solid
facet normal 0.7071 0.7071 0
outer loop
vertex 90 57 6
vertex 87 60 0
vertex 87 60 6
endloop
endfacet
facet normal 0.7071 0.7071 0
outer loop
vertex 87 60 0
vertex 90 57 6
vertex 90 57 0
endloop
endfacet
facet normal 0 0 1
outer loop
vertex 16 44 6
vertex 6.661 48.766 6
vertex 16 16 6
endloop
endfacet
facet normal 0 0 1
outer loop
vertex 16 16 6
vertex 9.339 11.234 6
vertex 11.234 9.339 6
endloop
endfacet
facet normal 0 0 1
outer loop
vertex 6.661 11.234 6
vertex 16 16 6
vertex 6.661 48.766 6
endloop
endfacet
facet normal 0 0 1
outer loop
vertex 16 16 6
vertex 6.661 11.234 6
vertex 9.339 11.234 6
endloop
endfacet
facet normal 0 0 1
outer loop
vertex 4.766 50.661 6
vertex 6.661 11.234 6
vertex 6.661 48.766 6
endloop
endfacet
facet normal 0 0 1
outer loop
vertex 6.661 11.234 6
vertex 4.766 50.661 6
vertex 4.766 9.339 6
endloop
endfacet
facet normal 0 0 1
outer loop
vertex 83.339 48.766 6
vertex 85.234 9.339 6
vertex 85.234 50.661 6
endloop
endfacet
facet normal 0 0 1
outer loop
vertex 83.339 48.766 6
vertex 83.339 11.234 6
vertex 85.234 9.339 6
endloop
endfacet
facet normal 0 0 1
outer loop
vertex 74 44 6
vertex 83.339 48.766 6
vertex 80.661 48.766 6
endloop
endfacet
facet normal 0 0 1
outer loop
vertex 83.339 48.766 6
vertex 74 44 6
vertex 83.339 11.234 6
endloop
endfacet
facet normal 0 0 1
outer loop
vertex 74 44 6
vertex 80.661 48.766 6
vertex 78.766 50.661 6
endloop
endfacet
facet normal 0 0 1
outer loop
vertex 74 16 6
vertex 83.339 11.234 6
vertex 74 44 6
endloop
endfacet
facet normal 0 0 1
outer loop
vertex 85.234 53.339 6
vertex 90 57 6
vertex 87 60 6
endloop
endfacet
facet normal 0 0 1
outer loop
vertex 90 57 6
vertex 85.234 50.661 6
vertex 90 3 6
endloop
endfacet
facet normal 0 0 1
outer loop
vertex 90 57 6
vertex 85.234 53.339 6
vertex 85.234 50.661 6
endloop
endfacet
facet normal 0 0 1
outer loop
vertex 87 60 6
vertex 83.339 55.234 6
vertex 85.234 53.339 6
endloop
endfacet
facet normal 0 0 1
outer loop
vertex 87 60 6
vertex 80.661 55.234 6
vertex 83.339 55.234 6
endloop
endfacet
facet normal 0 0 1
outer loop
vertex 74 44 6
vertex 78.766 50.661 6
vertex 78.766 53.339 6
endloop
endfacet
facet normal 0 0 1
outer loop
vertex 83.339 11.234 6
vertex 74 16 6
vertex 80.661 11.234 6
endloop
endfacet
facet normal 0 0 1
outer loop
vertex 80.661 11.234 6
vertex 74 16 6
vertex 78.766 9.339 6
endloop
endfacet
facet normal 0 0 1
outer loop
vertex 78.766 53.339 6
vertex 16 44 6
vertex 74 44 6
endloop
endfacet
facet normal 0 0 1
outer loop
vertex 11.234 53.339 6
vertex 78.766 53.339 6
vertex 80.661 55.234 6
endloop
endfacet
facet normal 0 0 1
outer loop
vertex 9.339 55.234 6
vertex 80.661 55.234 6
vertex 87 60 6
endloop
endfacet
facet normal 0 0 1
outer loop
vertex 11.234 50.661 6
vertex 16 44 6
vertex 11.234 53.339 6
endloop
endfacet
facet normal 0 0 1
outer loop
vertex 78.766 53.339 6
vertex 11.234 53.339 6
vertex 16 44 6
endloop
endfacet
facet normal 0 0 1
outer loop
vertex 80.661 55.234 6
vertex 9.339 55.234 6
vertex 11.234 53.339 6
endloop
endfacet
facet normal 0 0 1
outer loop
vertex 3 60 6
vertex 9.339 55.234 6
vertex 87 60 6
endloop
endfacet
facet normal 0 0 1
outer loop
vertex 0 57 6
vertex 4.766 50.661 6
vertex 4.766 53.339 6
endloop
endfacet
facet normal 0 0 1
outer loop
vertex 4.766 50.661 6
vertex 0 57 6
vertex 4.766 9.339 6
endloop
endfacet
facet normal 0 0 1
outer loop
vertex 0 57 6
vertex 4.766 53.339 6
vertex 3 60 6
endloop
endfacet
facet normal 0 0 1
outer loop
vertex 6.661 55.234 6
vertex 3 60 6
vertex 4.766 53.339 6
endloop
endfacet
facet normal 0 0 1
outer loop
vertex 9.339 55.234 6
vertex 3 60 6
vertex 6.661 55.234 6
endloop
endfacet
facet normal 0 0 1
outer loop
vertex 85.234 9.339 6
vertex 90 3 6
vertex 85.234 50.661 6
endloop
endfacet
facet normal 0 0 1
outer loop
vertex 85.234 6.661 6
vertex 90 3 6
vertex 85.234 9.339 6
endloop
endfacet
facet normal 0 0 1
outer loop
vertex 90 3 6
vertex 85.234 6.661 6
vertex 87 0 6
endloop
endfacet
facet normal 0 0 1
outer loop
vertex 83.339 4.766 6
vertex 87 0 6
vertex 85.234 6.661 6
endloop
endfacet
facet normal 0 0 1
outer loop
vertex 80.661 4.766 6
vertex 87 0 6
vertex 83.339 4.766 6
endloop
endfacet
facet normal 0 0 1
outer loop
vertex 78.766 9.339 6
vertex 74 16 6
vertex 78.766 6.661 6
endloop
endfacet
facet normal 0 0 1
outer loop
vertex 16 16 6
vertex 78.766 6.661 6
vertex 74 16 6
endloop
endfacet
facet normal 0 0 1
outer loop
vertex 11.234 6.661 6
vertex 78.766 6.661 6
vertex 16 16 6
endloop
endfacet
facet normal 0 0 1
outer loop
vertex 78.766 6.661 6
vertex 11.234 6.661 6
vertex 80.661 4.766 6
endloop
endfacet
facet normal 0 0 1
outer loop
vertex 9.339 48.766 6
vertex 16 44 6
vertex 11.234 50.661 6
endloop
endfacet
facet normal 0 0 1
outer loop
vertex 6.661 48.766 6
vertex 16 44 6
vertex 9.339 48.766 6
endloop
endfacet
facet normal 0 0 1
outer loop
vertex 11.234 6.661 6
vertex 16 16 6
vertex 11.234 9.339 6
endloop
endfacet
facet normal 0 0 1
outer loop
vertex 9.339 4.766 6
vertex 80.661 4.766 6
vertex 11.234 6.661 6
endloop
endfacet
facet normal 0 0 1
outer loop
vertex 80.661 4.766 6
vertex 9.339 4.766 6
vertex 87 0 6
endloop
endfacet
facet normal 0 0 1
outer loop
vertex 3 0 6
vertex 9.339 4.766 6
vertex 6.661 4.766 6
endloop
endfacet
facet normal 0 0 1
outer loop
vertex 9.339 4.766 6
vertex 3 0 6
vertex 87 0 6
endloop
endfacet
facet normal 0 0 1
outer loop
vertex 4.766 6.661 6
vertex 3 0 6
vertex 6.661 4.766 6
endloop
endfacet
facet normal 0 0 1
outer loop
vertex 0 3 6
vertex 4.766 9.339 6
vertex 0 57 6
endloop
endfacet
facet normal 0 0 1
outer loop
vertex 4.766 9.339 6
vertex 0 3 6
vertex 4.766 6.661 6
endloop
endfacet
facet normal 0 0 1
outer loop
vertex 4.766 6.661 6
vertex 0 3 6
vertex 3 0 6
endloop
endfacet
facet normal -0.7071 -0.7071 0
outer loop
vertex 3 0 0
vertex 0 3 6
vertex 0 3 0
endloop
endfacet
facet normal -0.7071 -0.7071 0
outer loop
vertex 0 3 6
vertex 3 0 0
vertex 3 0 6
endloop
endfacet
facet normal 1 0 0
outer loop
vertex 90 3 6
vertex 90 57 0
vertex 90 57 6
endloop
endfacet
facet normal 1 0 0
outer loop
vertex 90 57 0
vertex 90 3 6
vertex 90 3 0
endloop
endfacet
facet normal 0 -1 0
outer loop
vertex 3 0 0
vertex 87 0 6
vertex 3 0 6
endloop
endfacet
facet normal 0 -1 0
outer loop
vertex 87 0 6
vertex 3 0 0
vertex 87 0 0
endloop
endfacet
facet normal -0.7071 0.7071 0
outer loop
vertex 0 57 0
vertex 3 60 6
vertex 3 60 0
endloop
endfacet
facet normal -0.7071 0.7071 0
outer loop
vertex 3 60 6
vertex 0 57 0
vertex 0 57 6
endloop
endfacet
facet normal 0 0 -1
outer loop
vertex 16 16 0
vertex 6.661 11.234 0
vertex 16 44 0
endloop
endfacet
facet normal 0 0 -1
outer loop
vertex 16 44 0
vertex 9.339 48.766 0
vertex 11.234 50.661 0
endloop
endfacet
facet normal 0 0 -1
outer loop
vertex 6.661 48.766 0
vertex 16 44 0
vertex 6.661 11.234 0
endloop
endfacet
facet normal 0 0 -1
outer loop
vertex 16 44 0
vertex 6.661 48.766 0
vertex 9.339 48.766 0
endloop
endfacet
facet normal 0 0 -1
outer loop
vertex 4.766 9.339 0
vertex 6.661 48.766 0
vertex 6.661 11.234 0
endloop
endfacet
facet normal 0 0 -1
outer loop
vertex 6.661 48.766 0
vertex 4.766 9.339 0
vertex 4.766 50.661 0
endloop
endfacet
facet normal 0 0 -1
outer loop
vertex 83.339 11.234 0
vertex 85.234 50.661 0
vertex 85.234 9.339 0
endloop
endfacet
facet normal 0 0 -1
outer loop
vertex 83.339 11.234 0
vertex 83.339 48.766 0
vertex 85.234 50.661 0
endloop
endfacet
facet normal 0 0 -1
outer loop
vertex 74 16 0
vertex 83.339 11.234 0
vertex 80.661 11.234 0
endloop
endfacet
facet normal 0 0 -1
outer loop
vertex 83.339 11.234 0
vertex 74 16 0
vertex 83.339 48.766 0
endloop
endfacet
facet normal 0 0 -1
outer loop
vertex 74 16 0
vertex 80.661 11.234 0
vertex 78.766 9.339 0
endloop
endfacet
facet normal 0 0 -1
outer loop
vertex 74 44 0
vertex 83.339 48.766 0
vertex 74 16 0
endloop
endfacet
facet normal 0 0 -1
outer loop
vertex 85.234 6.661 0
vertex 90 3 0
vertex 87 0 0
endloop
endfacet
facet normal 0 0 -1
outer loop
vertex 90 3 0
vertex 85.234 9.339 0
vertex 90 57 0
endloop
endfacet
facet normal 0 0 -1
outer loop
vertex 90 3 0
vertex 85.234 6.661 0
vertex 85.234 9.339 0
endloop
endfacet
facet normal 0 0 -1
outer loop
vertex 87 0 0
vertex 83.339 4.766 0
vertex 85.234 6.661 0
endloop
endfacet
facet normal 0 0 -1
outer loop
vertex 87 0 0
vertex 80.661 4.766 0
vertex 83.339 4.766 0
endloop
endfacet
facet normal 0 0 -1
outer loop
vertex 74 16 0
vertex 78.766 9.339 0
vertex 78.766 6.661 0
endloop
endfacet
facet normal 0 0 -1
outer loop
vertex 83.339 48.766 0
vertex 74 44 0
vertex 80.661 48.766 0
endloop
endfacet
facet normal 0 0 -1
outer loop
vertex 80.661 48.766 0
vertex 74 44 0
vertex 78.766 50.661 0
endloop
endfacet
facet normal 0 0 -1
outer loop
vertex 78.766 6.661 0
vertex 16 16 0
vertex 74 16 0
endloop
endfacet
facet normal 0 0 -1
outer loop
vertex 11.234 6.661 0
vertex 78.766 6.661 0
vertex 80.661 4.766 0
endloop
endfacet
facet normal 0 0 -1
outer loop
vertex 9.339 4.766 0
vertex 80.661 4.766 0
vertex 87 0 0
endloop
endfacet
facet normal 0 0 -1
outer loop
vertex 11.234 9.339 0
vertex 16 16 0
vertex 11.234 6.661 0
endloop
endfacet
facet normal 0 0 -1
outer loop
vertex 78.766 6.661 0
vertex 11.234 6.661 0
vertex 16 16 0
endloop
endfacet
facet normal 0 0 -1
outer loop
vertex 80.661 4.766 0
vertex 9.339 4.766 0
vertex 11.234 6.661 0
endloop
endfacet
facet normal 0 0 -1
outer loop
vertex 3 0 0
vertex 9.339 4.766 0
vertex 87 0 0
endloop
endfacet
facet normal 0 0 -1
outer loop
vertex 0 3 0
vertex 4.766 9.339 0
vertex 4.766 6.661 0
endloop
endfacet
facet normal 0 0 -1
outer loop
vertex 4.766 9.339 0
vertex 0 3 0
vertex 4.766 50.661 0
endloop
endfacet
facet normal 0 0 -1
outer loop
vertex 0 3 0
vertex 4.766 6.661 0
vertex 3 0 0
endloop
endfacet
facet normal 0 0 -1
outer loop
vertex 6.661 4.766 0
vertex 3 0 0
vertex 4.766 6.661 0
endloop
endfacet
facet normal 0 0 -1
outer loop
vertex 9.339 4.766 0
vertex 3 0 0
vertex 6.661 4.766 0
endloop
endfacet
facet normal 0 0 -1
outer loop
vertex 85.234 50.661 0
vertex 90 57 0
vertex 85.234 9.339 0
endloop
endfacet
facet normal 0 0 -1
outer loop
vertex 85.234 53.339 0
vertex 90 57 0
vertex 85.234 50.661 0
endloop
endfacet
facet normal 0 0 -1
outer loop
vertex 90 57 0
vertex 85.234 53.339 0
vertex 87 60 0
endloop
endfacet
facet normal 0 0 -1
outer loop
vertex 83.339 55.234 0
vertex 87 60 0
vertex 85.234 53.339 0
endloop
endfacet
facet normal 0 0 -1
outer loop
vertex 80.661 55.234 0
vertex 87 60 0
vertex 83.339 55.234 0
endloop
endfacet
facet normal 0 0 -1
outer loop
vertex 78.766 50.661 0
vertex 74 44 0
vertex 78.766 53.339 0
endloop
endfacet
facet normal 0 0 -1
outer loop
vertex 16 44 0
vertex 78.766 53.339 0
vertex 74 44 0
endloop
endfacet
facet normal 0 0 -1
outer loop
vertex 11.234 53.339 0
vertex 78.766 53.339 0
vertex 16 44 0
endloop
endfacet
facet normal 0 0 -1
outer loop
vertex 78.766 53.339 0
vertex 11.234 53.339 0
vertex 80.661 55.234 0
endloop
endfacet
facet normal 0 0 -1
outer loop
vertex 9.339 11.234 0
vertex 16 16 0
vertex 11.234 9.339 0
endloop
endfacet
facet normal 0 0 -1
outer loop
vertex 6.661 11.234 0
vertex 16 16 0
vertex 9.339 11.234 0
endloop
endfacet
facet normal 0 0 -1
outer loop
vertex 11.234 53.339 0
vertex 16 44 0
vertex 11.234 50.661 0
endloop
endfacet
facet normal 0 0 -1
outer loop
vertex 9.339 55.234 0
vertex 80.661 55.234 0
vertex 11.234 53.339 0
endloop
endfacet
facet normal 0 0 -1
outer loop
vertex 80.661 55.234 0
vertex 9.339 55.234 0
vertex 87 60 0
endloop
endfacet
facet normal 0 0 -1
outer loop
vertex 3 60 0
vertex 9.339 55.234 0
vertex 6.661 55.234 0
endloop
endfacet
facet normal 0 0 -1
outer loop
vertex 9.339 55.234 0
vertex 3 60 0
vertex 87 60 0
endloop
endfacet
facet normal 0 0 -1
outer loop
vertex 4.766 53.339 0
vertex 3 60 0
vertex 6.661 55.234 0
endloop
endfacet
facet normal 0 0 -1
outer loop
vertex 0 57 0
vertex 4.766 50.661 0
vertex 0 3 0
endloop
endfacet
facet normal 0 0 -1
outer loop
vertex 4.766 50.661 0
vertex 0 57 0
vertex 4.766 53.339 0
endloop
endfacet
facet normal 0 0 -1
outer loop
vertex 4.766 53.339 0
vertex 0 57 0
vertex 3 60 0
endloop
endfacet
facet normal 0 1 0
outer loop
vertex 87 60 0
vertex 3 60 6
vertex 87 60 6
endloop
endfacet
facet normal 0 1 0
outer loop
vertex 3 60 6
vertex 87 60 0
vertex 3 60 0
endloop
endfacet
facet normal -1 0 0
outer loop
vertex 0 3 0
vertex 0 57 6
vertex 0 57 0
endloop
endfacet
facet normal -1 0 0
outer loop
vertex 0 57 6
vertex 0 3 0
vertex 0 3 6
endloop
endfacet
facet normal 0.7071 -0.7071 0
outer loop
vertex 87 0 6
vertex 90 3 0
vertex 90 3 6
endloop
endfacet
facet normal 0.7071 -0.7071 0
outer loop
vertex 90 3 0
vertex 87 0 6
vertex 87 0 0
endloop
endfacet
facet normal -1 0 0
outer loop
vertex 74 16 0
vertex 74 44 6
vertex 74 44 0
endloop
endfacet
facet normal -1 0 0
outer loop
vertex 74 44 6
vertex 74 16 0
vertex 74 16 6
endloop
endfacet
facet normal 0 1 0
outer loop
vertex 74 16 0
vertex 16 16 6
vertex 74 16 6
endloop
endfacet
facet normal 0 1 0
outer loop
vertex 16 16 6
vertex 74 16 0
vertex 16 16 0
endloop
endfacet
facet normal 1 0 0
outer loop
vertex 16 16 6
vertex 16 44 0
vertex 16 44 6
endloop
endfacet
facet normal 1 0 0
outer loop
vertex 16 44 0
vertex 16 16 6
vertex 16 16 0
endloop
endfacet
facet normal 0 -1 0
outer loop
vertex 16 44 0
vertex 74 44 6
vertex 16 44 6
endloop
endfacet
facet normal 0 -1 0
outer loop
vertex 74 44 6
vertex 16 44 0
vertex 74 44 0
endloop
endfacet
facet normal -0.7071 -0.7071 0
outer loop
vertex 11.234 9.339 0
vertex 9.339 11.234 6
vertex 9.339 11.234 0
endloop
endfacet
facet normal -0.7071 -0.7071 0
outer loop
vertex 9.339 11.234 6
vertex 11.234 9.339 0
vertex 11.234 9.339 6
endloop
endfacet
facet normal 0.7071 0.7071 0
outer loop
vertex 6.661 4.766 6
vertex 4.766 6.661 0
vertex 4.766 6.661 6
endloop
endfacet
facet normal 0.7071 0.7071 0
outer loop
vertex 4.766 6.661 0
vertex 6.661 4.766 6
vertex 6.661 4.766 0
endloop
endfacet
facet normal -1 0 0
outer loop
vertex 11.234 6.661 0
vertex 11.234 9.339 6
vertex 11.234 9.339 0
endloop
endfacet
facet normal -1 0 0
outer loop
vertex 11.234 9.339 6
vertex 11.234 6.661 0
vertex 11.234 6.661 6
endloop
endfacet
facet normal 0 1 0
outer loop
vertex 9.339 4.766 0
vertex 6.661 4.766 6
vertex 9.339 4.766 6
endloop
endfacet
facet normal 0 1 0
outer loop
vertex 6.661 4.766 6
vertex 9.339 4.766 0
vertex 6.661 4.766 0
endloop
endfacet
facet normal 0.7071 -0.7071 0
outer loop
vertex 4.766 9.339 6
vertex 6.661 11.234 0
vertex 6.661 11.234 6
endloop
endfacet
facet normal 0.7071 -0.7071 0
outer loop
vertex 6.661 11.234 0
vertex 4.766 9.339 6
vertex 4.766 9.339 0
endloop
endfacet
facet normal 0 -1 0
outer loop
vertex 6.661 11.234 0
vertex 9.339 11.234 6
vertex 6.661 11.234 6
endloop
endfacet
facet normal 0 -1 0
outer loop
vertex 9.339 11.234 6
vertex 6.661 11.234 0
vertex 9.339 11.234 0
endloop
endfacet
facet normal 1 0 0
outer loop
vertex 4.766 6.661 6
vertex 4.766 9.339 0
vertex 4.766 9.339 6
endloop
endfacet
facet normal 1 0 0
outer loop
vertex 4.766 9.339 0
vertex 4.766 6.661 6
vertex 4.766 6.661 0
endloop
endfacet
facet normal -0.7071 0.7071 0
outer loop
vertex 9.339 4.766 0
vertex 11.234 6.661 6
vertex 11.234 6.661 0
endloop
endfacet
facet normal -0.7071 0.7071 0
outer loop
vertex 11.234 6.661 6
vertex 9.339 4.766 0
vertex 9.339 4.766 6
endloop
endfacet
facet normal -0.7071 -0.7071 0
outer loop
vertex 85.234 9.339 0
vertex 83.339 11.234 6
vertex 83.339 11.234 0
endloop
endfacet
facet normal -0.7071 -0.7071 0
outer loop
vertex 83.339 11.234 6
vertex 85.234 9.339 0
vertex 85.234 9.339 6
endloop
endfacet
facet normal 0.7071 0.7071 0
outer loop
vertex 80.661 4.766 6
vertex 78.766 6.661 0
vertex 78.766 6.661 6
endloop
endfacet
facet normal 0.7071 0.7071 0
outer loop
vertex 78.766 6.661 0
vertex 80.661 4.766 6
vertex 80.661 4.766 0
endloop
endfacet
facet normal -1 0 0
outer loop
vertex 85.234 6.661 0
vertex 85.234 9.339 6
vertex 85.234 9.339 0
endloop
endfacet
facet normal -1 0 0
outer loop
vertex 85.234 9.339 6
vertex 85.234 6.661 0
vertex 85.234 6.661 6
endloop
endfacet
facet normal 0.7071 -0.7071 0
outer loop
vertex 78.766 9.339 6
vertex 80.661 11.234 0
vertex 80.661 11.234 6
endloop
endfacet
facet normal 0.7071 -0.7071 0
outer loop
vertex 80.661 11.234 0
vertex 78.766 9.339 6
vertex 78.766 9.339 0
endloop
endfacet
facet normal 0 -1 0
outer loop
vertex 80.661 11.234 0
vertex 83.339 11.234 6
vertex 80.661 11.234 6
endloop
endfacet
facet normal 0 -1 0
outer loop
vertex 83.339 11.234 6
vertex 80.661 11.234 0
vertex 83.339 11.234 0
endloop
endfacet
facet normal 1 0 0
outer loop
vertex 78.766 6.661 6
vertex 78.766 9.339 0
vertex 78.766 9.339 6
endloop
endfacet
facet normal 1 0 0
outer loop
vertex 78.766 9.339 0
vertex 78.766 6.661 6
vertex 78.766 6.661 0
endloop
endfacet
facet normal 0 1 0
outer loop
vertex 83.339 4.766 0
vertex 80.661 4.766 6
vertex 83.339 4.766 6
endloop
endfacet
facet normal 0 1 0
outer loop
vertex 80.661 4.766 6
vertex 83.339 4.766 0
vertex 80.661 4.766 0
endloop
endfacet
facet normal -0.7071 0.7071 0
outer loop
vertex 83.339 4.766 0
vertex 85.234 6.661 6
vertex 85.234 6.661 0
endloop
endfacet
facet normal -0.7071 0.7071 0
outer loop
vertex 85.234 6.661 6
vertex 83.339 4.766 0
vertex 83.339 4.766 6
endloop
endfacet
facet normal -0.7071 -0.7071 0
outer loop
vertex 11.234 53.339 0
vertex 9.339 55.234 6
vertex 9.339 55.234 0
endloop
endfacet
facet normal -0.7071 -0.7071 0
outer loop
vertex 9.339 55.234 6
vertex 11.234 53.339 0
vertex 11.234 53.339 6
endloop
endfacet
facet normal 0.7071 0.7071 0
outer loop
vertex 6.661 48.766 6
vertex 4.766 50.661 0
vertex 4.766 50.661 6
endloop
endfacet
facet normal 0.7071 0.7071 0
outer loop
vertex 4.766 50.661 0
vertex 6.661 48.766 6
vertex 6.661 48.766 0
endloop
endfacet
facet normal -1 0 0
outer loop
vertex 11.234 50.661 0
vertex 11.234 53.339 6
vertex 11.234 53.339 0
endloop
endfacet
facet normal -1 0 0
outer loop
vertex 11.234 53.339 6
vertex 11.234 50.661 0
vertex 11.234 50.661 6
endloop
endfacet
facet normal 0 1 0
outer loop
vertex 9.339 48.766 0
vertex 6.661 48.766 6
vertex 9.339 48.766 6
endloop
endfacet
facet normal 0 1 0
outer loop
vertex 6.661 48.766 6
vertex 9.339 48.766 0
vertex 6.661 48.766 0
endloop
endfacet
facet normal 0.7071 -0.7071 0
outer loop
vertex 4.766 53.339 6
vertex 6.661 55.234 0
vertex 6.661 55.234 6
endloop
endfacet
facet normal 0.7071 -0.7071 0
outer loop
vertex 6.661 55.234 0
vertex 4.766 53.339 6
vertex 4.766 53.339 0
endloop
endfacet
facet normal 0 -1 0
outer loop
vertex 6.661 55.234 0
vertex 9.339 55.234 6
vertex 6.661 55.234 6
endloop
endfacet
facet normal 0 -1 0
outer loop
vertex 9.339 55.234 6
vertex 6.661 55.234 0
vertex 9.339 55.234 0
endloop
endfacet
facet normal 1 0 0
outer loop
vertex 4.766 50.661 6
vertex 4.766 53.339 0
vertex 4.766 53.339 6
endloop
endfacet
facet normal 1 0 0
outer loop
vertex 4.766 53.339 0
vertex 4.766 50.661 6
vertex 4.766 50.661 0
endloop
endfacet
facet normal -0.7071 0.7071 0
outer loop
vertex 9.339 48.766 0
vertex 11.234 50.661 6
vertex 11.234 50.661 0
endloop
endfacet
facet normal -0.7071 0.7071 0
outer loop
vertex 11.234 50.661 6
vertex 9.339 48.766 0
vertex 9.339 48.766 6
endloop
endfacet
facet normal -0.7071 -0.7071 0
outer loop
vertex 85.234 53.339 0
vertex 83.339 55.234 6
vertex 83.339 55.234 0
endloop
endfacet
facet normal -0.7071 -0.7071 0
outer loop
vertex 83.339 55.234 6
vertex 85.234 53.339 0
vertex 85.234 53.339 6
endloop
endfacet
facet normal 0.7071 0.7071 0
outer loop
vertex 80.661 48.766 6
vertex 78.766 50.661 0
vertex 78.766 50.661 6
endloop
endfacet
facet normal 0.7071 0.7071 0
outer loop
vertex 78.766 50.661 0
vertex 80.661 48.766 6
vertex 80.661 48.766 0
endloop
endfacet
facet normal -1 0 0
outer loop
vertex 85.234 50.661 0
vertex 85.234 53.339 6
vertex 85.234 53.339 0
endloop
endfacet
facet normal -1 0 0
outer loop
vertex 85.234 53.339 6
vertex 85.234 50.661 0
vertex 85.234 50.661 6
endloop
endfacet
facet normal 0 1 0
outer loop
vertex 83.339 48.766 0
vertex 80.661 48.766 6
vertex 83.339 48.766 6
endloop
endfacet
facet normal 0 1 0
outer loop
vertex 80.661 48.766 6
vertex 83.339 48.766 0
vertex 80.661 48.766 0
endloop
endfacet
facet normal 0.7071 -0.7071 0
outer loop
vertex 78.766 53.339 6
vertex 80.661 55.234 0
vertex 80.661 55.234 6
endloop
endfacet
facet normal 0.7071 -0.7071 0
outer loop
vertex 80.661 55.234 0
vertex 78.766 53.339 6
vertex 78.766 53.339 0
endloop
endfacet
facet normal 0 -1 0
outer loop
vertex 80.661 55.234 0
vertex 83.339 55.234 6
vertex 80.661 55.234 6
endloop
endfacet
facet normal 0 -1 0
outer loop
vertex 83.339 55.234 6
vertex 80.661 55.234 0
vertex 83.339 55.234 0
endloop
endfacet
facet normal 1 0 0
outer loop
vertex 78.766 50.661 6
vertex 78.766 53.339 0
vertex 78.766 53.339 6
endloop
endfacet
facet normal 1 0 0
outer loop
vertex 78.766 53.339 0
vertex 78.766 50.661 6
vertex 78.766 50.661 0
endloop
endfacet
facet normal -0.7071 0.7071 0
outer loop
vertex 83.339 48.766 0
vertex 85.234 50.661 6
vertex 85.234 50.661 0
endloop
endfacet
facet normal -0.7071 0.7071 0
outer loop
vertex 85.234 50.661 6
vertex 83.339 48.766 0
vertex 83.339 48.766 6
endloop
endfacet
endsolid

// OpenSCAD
$fn = 32;

// ----------------------------------------------------------------------
// Frame plate: 90 x 60 frame, 16 mm rails
// ----------------------------------------------------------------------

// --- parameters (mm) ---
plate_l = 90;             // plate length, X
plate_w = 60;             // plate width, Y
plate_t = 6;              // plate thickness, Z (extrusion height)
corner_c = 3;             // corner chamfer
frame_bar = 16;           // frame rail width
bolt_r = 3.5;             // corner bolt window radius
bolt_inset = 8;           // bolt centre inset from the edges

win_l = plate_l - 2 * frame_bar;  // window length
win_w = plate_w - 2 * frame_bar;  // window width
bolt_d = 2 * bolt_r;  // corner hole diameter

profile = [[3, 0], [87, 0], [90, 3], [90, 57], [87, 60], [3, 60], [0, 57], [0, 3]];  // primary outline, 8 points, counter clockwise
void_1 = [[16, 16], [74, 16], [74, 44], [16, 44]];  // the window, 4 points
void_2 = [[11.234, 9.339], [9.339, 11.234], [6.661, 11.234], [4.766, 9.339], [4.766, 6.661], [6.661, 4.766], [9.339, 4.766], [11.234, 6.661]];  // corner bolt window, 8 points
void_3 = [[85.234, 9.339], [83.339, 11.234], [80.661, 11.234], [78.766, 9.339], [78.766, 6.661], [80.661, 4.766], [83.339, 4.766], [85.234, 6.661]];  // corner bolt window, 8 points
void_4 = [[11.234, 53.339], [9.339, 55.234], [6.661, 55.234], [4.766, 53.339], [4.766, 50.661], [6.661, 48.766], [9.339, 48.766], [11.234, 50.661]];  // corner bolt window, 8 points
void_5 = [[85.234, 53.339], [83.339, 55.234], [80.661, 55.234], [78.766, 53.339], [78.766, 50.661], [80.661, 48.766], [83.339, 48.766], [85.234, 50.661]];  // corner bolt window, 8 points

// --- the one profile operation ---
difference() {
  linear_extrude(height = plate_t) polygon(points = profile);
  translate([0, 0, -1])
    linear_extrude(height = plate_t + 2) polygon(points = void_1);
  translate([0, 0, -1])
    linear_extrude(height = plate_t + 2) polygon(points = void_2);
  translate([0, 0, -1])
    linear_extrude(height = plate_t + 2) polygon(points = void_3);
  translate([0, 0, -1])
    linear_extrude(height = plate_t + 2) polygon(points = void_4);
  translate([0, 0, -1])
    linear_extrude(height = plate_t + 2) polygon(points = void_5);
}
